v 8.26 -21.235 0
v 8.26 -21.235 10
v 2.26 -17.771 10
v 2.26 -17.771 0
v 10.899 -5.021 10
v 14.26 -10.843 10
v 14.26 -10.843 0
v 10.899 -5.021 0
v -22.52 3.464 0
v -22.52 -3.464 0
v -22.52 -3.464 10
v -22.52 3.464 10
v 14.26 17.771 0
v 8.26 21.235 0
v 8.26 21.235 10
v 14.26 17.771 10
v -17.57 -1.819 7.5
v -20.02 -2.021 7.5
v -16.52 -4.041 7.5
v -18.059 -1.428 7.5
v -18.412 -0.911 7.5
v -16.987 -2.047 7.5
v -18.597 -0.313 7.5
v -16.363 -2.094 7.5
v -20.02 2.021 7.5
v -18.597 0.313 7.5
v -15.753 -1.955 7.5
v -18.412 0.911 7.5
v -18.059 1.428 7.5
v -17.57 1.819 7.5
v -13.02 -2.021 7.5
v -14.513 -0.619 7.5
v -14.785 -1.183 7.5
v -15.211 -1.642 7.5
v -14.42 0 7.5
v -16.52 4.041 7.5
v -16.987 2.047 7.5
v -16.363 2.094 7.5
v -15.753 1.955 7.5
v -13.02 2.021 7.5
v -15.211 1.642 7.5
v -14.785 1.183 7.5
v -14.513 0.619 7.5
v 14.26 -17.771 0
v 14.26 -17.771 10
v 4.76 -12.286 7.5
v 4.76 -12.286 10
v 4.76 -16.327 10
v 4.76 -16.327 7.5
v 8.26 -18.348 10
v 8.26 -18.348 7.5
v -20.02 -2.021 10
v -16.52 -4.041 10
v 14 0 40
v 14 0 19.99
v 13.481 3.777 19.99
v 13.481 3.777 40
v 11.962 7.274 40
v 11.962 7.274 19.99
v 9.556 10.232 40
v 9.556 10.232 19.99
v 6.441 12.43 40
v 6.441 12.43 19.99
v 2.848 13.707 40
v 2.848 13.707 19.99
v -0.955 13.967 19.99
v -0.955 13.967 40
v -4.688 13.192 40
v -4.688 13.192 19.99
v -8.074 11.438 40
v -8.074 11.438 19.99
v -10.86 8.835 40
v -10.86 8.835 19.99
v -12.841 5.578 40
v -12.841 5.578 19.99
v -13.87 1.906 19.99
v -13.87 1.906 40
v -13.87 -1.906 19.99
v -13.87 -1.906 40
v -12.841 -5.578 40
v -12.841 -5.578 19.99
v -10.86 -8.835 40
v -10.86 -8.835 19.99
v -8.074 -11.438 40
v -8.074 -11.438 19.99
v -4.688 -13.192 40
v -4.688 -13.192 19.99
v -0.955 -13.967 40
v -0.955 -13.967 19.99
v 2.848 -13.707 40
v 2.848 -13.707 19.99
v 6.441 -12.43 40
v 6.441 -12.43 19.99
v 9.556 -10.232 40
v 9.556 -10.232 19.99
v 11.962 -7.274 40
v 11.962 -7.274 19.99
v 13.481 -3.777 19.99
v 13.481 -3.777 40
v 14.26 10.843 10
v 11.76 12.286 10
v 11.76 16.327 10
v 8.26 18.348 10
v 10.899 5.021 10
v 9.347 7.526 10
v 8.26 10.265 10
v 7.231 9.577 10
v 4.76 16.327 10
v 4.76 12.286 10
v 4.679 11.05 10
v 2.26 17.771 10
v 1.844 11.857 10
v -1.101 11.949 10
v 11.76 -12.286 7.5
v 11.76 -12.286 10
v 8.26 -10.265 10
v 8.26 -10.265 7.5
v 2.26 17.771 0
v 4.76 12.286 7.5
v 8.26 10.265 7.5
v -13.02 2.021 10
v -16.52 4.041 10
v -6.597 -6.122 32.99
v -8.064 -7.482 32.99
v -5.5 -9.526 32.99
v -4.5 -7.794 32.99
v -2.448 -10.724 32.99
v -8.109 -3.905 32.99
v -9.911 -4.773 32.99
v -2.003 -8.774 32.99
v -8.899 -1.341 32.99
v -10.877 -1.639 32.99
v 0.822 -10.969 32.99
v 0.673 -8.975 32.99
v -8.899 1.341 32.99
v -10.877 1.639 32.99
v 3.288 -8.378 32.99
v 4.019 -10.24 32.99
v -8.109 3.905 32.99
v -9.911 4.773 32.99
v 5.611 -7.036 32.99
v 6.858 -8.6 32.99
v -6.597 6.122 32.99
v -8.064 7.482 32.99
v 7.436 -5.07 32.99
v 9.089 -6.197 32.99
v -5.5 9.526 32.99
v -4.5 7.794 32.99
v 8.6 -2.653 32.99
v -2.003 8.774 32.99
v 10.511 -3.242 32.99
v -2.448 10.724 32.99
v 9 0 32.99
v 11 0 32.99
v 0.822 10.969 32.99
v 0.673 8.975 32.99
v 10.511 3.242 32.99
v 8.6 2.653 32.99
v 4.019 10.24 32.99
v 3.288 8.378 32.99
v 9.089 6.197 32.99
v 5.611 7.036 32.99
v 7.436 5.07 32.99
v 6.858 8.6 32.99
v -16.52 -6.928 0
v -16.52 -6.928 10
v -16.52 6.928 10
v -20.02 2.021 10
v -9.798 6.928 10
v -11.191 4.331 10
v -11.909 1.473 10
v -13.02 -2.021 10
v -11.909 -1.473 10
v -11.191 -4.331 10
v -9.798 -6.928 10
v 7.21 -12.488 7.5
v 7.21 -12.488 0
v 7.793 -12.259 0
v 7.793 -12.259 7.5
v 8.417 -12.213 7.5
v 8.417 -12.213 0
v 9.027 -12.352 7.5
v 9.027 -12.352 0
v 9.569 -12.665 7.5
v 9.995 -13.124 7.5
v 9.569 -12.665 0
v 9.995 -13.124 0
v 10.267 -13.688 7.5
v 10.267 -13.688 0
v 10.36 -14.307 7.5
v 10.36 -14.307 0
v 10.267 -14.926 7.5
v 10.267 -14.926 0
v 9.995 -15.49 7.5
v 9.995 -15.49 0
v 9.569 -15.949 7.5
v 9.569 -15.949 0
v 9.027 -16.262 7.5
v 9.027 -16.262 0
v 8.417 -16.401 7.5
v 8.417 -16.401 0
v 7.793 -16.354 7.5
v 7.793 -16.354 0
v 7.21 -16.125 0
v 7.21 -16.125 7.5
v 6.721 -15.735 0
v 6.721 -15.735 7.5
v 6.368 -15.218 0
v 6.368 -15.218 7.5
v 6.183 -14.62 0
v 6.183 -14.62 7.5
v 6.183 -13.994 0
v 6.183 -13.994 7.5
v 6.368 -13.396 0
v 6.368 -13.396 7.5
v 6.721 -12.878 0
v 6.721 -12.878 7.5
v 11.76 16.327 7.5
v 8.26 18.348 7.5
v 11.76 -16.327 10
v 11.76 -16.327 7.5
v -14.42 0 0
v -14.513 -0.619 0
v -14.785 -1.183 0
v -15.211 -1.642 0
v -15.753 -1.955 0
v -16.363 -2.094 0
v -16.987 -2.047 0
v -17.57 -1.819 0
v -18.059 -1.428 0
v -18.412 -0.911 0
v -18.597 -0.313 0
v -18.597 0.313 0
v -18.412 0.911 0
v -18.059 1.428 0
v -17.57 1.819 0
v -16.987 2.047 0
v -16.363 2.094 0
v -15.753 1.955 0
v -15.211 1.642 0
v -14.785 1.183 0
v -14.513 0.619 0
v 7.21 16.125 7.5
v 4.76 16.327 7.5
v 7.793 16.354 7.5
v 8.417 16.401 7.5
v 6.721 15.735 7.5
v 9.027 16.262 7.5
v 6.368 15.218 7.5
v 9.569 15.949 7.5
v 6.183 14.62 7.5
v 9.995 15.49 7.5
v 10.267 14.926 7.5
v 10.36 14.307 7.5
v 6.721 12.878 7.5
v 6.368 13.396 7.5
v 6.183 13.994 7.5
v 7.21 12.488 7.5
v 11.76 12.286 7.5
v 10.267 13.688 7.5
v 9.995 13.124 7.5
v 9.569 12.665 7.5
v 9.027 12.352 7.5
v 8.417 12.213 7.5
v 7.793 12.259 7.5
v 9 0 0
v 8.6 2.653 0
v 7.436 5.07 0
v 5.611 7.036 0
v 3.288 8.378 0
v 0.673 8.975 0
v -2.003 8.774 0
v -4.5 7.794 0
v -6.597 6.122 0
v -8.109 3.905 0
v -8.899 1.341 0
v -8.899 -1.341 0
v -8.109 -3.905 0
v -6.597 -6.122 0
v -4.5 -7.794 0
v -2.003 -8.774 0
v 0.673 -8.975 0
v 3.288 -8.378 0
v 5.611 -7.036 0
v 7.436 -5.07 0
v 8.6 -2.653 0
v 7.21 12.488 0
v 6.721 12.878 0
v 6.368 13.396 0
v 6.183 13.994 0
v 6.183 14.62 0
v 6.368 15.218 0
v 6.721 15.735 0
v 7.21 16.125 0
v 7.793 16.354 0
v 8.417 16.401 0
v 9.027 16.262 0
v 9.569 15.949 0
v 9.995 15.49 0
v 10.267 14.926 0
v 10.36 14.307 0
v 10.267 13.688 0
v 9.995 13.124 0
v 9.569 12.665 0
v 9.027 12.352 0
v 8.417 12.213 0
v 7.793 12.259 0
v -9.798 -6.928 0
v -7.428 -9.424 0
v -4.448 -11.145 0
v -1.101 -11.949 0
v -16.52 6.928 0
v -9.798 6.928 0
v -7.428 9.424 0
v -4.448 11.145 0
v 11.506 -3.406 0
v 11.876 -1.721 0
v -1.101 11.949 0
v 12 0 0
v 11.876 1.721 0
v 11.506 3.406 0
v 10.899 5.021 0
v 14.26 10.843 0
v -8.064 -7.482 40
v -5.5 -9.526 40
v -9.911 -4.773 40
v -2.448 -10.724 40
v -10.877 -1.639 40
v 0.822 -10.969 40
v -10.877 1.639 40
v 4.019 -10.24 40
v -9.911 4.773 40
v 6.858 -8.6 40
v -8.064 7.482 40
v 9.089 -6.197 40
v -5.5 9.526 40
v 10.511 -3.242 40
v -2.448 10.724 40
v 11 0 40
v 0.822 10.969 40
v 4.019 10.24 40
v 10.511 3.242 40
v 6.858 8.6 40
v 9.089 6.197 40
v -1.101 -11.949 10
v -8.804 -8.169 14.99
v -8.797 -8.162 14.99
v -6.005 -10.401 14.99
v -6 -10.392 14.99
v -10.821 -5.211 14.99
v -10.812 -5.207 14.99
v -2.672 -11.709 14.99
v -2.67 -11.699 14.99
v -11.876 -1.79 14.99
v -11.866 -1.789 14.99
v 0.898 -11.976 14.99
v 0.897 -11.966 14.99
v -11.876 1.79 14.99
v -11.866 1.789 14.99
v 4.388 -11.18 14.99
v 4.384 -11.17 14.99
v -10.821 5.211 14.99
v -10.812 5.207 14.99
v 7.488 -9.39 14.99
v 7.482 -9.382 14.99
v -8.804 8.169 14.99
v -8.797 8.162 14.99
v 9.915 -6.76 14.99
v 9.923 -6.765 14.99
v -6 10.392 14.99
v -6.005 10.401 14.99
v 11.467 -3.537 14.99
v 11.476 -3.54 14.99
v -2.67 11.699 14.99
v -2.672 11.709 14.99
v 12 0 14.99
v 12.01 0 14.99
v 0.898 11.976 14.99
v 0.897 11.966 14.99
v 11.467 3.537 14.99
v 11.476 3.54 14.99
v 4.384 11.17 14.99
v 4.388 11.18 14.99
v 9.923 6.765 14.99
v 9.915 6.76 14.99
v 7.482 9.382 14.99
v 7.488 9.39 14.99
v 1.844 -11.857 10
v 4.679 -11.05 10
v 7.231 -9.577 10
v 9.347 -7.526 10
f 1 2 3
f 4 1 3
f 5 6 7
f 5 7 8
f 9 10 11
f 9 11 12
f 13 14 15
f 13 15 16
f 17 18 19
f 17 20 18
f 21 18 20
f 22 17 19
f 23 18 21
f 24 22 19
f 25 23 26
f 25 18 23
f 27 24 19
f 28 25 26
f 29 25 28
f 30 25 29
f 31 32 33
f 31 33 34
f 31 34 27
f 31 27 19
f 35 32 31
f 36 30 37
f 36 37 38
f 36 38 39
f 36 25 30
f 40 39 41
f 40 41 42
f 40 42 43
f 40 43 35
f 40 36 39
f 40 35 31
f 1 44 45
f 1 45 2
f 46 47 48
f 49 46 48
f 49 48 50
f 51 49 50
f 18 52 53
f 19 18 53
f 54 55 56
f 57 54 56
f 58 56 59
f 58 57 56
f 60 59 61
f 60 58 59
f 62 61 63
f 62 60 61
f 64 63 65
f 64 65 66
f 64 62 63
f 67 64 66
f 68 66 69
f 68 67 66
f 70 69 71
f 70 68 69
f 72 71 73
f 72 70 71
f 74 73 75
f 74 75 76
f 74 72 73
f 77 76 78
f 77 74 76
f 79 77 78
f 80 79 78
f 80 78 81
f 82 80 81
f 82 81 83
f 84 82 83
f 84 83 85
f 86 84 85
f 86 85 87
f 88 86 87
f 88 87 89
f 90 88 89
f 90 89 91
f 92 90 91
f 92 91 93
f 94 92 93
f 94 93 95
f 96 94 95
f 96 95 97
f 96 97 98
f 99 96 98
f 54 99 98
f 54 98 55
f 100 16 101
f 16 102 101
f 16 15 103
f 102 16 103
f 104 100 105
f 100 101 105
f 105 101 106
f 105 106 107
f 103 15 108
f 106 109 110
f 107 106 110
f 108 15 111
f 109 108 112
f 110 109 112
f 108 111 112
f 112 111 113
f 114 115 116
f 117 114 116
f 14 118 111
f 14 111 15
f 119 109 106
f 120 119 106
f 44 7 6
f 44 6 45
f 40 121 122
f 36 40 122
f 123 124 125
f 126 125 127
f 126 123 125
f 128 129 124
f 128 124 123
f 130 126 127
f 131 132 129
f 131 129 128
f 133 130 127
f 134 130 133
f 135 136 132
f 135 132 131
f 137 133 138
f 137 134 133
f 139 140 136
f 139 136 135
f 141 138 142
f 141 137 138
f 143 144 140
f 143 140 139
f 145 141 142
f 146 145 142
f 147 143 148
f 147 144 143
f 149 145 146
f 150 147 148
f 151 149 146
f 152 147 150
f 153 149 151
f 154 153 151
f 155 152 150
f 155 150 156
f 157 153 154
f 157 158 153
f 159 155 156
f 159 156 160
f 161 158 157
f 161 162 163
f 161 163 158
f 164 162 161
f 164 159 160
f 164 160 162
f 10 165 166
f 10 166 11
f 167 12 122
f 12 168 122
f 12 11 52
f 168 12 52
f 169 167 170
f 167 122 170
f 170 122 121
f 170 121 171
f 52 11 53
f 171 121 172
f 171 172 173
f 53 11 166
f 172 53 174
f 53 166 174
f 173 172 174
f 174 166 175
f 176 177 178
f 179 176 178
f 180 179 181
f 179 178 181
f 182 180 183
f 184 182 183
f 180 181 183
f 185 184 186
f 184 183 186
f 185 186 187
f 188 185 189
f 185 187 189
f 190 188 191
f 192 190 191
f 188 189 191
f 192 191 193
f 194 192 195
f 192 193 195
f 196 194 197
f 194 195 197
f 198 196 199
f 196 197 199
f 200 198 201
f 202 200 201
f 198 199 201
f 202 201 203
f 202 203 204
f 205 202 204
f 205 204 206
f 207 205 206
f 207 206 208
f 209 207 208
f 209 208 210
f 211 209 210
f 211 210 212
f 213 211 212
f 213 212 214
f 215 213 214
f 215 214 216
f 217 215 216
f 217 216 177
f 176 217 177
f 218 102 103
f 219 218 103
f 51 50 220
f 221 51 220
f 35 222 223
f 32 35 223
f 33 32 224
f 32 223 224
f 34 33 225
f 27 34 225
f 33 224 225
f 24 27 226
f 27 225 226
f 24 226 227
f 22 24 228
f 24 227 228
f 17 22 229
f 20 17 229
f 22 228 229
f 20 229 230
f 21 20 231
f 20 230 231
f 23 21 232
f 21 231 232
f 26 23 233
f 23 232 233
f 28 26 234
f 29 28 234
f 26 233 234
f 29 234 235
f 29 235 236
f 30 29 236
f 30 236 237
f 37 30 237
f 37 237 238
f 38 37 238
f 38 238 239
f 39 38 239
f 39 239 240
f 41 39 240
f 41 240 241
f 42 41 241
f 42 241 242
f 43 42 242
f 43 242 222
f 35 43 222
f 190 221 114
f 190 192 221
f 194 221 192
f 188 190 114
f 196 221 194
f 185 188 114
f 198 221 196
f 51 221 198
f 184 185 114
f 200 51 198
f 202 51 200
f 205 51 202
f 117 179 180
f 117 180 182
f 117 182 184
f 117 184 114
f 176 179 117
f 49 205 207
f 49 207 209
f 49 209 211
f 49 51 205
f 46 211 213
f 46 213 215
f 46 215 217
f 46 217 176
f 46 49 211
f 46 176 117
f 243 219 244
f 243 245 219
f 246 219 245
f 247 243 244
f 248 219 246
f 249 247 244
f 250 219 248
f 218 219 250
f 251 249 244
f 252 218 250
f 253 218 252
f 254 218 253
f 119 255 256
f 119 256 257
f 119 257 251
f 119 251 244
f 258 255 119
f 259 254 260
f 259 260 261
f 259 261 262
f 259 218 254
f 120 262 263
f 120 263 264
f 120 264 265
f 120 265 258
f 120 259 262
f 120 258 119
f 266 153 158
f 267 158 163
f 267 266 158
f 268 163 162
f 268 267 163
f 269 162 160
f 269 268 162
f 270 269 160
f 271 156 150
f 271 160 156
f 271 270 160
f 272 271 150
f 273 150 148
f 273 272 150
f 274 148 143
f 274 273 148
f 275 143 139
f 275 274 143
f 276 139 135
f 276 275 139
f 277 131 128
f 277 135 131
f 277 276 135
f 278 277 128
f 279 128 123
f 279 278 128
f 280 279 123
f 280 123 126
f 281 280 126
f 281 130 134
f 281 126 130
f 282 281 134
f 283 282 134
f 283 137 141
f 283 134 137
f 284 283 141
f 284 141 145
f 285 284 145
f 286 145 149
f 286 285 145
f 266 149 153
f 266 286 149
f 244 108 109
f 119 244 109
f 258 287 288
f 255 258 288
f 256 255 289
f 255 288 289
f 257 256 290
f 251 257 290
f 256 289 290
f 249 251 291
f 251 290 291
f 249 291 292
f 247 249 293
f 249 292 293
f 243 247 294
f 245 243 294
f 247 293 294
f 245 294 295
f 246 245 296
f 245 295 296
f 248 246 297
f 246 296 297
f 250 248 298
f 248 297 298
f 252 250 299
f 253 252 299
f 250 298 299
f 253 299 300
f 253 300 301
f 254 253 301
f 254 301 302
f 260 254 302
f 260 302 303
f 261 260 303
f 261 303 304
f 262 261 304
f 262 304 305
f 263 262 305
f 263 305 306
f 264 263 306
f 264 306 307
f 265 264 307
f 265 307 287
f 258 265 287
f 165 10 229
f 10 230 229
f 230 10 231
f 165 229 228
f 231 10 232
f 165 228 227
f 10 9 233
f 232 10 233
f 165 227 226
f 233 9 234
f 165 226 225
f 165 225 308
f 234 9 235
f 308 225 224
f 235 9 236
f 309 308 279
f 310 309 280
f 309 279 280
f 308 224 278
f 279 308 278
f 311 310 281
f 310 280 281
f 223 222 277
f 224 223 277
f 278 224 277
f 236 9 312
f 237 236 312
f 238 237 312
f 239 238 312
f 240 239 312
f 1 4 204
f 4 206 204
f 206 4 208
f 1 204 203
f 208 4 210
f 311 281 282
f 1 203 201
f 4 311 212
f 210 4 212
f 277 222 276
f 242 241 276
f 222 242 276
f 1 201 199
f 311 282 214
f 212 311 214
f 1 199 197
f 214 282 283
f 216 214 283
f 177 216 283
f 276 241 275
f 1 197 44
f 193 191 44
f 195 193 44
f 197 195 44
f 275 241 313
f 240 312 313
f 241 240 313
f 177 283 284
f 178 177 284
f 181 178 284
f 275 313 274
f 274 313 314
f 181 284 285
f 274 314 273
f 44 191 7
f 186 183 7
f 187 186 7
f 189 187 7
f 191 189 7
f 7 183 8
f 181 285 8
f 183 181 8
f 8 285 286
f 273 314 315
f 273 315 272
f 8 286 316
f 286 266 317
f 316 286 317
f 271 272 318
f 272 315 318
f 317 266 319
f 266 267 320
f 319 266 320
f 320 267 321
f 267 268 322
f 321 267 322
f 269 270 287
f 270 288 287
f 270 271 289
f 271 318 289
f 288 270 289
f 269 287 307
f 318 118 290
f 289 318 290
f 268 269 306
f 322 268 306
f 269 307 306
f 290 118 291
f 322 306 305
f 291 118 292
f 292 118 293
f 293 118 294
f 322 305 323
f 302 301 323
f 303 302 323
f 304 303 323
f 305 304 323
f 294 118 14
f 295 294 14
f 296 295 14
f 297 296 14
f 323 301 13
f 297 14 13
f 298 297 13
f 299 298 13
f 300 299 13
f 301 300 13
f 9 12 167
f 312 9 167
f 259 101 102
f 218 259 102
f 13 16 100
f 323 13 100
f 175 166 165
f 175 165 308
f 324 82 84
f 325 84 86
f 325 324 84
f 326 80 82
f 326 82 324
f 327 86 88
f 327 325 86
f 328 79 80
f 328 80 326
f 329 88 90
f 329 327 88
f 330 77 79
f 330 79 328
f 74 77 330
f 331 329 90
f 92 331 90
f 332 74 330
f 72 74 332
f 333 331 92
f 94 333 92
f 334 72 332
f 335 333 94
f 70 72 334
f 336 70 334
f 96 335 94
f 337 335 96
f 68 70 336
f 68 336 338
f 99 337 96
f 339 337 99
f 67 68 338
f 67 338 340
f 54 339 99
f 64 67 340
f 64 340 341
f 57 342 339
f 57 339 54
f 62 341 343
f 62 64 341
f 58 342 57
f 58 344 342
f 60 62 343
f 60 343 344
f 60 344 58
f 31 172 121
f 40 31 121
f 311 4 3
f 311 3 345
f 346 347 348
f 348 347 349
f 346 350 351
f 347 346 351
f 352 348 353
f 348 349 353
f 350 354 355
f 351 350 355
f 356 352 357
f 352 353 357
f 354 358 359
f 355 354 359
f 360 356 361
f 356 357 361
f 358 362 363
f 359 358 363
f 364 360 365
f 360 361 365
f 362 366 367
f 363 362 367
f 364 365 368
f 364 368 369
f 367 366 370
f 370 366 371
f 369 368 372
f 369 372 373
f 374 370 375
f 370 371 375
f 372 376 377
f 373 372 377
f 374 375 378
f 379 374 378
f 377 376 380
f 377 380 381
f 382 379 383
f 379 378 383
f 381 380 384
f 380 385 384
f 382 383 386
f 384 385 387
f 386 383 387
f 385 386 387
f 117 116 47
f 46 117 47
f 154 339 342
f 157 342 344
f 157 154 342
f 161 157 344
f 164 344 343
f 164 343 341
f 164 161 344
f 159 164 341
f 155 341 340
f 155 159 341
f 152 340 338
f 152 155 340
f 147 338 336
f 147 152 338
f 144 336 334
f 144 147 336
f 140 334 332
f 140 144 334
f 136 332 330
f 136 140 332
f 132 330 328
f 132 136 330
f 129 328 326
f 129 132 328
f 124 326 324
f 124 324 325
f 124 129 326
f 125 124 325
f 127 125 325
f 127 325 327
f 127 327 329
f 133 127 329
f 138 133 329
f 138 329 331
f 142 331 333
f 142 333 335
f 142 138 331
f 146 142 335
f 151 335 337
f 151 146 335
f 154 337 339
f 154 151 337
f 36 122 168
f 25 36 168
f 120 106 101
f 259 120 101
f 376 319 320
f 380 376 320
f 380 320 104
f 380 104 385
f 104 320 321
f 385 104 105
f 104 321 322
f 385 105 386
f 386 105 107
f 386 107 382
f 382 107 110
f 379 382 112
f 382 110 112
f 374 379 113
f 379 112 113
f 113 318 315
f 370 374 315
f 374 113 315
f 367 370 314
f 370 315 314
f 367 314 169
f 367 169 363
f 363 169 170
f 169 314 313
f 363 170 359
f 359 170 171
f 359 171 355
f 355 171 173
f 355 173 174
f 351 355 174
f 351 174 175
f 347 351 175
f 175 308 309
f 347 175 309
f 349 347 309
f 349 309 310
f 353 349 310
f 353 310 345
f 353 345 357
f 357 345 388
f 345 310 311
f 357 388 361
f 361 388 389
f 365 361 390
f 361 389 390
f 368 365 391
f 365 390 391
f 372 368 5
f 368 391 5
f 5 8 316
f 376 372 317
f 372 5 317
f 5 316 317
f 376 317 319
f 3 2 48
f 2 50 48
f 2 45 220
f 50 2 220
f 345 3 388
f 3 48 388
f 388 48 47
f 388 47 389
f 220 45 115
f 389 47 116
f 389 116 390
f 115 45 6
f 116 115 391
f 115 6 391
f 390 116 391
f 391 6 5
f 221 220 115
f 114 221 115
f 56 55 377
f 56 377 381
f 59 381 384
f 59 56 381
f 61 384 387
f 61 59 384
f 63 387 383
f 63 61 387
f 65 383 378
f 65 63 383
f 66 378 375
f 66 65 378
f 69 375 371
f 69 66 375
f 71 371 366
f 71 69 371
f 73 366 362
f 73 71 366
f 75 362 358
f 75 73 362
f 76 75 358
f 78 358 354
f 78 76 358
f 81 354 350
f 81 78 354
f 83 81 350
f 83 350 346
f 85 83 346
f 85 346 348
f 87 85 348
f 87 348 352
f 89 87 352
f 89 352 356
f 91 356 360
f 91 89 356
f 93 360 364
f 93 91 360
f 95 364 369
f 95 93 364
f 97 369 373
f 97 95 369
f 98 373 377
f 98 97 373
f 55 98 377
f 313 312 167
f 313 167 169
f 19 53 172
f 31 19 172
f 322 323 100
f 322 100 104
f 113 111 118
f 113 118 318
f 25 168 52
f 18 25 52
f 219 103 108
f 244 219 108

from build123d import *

# Parameters (mm, degrees)
SKETCH_R              = 12
SKETCH_R_2            = 9
PAD_DEPTH             = 39.99
SKETCH001_R           = 11
POCKET_DEPTH          = 7
SKETCH002_R           = 2.1
PAD001_DEPTH          = 10
POLARPATTERN_COUNT    = 3
POCKET001_DEPTH       = 2.5
POLARPATTERN001_COUNT = 3
SKETCH004_R           = 14
SKETCH004_R_2         = 11
PAD002_DEPTH          = 0.01
PAD002_DEPTH_BACK     = 25
CHAMFER_SIZE2         = 5
CHAMFER_SIZE          = 1.99


with BuildPart() as part:
    # Sketch → Pad (new body)
    with BuildSketch(Plane.XY):
        Circle(SKETCH_R)
        Circle(SKETCH_R_2, mode=Mode.SUBTRACT)
    extrude(amount=PAD_DEPTH)

    # Sketch001 (on Face4 of Pad) → Pocket (cut)
    with BuildSketch(Plane.XY.offset(39.99)):
        Circle(SKETCH001_R)
    extrude(amount=-POCKET_DEPTH, mode=Mode.SUBTRACT)

    # Sketch002 (on Face2 of Pocket) → Pad001 (join)
    with BuildSketch(Plane(origin=(0, 0, 0), x_dir=(1, 0, 0), z_dir=(0, 0, -1))):
        with BuildLine():
            Line((-16.52, 6.928203), (-22.52, 3.464102))
            Line((-22.52, 3.464102), (-22.52, -3.464102))
            Line((-22.52, -3.464102), (-16.52, -6.928203))
            Line((-16.52, -6.928203), (-9.797959, -6.928203))
            ThreePointArc((-9.797959, 6.928203), (-12, 0), (-9.797959, -6.928203))
            Line((-16.52, 6.928203), (-9.797959, 6.928203))
        make_face()
        with Locations((-16.52, 0)):
            Circle(SKETCH002_R, mode=Mode.SUBTRACT)
    pad001 = extrude(amount=-PAD001_DEPTH)

    # PolarPattern: Pad001 ×3 about axis
    polarpattern_axis = Axis((0, 0, 0), (0, 0, -1))
    for i in range(1, POLARPATTERN_COUNT):
        add(pad001.rotate(polarpattern_axis, i * 360 / POLARPATTERN_COUNT))

    # Sketch003 (on Face7 of PolarPattern) → Pocket001 (cut, symmetric)
    with BuildSketch(Plane.XY.offset(10)):
        Polygon((-13.02, 2.020726), (-16.52, 4.041452), (-20.02, 2.020726), (-20.02, -2.020726), (-16.52, -4.041452), (-13.02, -2.020726), align=None)
    pocket001 = extrude(amount=POCKET001_DEPTH, both=True, mode=Mode.SUBTRACT)

    # PolarPattern001: Pocket001 ×3 about axis
    polarpattern001_axis = Axis((0, 0, 10), (0, 0, 1))
    for i in range(1, POLARPATTERN001_COUNT):
        add(pocket001.rotate(polarpattern001_axis, i * 360 / POLARPATTERN001_COUNT), mode=Mode.SUBTRACT)

    # Sketch004 (on Face12 of PolarPattern001) → Pad002 (join, two sides)
    with BuildSketch(Plane.XY.offset(39.99)) as pad002_sk:
        Circle(SKETCH004_R)
        Circle(SKETCH004_R_2, mode=Mode.SUBTRACT)
    extrude(amount=PAD002_DEPTH)
    extrude(pad002_sk.sketch, amount=-PAD002_DEPTH_BACK)

    # Chamfer
    chamfer_edges = [part.edges().sort_by_distance(p)[0] for p in [
        (-14, 0, 14.99),
    ]]
    chamfer_side = part.faces().sort_by_distance((-13.60402, 0, 14.99))[0]
    chamfer(chamfer_edges, length=CHAMFER_SIZE, length2=CHAMFER_SIZE2, reference=chamfer_side)


solid = part.part
